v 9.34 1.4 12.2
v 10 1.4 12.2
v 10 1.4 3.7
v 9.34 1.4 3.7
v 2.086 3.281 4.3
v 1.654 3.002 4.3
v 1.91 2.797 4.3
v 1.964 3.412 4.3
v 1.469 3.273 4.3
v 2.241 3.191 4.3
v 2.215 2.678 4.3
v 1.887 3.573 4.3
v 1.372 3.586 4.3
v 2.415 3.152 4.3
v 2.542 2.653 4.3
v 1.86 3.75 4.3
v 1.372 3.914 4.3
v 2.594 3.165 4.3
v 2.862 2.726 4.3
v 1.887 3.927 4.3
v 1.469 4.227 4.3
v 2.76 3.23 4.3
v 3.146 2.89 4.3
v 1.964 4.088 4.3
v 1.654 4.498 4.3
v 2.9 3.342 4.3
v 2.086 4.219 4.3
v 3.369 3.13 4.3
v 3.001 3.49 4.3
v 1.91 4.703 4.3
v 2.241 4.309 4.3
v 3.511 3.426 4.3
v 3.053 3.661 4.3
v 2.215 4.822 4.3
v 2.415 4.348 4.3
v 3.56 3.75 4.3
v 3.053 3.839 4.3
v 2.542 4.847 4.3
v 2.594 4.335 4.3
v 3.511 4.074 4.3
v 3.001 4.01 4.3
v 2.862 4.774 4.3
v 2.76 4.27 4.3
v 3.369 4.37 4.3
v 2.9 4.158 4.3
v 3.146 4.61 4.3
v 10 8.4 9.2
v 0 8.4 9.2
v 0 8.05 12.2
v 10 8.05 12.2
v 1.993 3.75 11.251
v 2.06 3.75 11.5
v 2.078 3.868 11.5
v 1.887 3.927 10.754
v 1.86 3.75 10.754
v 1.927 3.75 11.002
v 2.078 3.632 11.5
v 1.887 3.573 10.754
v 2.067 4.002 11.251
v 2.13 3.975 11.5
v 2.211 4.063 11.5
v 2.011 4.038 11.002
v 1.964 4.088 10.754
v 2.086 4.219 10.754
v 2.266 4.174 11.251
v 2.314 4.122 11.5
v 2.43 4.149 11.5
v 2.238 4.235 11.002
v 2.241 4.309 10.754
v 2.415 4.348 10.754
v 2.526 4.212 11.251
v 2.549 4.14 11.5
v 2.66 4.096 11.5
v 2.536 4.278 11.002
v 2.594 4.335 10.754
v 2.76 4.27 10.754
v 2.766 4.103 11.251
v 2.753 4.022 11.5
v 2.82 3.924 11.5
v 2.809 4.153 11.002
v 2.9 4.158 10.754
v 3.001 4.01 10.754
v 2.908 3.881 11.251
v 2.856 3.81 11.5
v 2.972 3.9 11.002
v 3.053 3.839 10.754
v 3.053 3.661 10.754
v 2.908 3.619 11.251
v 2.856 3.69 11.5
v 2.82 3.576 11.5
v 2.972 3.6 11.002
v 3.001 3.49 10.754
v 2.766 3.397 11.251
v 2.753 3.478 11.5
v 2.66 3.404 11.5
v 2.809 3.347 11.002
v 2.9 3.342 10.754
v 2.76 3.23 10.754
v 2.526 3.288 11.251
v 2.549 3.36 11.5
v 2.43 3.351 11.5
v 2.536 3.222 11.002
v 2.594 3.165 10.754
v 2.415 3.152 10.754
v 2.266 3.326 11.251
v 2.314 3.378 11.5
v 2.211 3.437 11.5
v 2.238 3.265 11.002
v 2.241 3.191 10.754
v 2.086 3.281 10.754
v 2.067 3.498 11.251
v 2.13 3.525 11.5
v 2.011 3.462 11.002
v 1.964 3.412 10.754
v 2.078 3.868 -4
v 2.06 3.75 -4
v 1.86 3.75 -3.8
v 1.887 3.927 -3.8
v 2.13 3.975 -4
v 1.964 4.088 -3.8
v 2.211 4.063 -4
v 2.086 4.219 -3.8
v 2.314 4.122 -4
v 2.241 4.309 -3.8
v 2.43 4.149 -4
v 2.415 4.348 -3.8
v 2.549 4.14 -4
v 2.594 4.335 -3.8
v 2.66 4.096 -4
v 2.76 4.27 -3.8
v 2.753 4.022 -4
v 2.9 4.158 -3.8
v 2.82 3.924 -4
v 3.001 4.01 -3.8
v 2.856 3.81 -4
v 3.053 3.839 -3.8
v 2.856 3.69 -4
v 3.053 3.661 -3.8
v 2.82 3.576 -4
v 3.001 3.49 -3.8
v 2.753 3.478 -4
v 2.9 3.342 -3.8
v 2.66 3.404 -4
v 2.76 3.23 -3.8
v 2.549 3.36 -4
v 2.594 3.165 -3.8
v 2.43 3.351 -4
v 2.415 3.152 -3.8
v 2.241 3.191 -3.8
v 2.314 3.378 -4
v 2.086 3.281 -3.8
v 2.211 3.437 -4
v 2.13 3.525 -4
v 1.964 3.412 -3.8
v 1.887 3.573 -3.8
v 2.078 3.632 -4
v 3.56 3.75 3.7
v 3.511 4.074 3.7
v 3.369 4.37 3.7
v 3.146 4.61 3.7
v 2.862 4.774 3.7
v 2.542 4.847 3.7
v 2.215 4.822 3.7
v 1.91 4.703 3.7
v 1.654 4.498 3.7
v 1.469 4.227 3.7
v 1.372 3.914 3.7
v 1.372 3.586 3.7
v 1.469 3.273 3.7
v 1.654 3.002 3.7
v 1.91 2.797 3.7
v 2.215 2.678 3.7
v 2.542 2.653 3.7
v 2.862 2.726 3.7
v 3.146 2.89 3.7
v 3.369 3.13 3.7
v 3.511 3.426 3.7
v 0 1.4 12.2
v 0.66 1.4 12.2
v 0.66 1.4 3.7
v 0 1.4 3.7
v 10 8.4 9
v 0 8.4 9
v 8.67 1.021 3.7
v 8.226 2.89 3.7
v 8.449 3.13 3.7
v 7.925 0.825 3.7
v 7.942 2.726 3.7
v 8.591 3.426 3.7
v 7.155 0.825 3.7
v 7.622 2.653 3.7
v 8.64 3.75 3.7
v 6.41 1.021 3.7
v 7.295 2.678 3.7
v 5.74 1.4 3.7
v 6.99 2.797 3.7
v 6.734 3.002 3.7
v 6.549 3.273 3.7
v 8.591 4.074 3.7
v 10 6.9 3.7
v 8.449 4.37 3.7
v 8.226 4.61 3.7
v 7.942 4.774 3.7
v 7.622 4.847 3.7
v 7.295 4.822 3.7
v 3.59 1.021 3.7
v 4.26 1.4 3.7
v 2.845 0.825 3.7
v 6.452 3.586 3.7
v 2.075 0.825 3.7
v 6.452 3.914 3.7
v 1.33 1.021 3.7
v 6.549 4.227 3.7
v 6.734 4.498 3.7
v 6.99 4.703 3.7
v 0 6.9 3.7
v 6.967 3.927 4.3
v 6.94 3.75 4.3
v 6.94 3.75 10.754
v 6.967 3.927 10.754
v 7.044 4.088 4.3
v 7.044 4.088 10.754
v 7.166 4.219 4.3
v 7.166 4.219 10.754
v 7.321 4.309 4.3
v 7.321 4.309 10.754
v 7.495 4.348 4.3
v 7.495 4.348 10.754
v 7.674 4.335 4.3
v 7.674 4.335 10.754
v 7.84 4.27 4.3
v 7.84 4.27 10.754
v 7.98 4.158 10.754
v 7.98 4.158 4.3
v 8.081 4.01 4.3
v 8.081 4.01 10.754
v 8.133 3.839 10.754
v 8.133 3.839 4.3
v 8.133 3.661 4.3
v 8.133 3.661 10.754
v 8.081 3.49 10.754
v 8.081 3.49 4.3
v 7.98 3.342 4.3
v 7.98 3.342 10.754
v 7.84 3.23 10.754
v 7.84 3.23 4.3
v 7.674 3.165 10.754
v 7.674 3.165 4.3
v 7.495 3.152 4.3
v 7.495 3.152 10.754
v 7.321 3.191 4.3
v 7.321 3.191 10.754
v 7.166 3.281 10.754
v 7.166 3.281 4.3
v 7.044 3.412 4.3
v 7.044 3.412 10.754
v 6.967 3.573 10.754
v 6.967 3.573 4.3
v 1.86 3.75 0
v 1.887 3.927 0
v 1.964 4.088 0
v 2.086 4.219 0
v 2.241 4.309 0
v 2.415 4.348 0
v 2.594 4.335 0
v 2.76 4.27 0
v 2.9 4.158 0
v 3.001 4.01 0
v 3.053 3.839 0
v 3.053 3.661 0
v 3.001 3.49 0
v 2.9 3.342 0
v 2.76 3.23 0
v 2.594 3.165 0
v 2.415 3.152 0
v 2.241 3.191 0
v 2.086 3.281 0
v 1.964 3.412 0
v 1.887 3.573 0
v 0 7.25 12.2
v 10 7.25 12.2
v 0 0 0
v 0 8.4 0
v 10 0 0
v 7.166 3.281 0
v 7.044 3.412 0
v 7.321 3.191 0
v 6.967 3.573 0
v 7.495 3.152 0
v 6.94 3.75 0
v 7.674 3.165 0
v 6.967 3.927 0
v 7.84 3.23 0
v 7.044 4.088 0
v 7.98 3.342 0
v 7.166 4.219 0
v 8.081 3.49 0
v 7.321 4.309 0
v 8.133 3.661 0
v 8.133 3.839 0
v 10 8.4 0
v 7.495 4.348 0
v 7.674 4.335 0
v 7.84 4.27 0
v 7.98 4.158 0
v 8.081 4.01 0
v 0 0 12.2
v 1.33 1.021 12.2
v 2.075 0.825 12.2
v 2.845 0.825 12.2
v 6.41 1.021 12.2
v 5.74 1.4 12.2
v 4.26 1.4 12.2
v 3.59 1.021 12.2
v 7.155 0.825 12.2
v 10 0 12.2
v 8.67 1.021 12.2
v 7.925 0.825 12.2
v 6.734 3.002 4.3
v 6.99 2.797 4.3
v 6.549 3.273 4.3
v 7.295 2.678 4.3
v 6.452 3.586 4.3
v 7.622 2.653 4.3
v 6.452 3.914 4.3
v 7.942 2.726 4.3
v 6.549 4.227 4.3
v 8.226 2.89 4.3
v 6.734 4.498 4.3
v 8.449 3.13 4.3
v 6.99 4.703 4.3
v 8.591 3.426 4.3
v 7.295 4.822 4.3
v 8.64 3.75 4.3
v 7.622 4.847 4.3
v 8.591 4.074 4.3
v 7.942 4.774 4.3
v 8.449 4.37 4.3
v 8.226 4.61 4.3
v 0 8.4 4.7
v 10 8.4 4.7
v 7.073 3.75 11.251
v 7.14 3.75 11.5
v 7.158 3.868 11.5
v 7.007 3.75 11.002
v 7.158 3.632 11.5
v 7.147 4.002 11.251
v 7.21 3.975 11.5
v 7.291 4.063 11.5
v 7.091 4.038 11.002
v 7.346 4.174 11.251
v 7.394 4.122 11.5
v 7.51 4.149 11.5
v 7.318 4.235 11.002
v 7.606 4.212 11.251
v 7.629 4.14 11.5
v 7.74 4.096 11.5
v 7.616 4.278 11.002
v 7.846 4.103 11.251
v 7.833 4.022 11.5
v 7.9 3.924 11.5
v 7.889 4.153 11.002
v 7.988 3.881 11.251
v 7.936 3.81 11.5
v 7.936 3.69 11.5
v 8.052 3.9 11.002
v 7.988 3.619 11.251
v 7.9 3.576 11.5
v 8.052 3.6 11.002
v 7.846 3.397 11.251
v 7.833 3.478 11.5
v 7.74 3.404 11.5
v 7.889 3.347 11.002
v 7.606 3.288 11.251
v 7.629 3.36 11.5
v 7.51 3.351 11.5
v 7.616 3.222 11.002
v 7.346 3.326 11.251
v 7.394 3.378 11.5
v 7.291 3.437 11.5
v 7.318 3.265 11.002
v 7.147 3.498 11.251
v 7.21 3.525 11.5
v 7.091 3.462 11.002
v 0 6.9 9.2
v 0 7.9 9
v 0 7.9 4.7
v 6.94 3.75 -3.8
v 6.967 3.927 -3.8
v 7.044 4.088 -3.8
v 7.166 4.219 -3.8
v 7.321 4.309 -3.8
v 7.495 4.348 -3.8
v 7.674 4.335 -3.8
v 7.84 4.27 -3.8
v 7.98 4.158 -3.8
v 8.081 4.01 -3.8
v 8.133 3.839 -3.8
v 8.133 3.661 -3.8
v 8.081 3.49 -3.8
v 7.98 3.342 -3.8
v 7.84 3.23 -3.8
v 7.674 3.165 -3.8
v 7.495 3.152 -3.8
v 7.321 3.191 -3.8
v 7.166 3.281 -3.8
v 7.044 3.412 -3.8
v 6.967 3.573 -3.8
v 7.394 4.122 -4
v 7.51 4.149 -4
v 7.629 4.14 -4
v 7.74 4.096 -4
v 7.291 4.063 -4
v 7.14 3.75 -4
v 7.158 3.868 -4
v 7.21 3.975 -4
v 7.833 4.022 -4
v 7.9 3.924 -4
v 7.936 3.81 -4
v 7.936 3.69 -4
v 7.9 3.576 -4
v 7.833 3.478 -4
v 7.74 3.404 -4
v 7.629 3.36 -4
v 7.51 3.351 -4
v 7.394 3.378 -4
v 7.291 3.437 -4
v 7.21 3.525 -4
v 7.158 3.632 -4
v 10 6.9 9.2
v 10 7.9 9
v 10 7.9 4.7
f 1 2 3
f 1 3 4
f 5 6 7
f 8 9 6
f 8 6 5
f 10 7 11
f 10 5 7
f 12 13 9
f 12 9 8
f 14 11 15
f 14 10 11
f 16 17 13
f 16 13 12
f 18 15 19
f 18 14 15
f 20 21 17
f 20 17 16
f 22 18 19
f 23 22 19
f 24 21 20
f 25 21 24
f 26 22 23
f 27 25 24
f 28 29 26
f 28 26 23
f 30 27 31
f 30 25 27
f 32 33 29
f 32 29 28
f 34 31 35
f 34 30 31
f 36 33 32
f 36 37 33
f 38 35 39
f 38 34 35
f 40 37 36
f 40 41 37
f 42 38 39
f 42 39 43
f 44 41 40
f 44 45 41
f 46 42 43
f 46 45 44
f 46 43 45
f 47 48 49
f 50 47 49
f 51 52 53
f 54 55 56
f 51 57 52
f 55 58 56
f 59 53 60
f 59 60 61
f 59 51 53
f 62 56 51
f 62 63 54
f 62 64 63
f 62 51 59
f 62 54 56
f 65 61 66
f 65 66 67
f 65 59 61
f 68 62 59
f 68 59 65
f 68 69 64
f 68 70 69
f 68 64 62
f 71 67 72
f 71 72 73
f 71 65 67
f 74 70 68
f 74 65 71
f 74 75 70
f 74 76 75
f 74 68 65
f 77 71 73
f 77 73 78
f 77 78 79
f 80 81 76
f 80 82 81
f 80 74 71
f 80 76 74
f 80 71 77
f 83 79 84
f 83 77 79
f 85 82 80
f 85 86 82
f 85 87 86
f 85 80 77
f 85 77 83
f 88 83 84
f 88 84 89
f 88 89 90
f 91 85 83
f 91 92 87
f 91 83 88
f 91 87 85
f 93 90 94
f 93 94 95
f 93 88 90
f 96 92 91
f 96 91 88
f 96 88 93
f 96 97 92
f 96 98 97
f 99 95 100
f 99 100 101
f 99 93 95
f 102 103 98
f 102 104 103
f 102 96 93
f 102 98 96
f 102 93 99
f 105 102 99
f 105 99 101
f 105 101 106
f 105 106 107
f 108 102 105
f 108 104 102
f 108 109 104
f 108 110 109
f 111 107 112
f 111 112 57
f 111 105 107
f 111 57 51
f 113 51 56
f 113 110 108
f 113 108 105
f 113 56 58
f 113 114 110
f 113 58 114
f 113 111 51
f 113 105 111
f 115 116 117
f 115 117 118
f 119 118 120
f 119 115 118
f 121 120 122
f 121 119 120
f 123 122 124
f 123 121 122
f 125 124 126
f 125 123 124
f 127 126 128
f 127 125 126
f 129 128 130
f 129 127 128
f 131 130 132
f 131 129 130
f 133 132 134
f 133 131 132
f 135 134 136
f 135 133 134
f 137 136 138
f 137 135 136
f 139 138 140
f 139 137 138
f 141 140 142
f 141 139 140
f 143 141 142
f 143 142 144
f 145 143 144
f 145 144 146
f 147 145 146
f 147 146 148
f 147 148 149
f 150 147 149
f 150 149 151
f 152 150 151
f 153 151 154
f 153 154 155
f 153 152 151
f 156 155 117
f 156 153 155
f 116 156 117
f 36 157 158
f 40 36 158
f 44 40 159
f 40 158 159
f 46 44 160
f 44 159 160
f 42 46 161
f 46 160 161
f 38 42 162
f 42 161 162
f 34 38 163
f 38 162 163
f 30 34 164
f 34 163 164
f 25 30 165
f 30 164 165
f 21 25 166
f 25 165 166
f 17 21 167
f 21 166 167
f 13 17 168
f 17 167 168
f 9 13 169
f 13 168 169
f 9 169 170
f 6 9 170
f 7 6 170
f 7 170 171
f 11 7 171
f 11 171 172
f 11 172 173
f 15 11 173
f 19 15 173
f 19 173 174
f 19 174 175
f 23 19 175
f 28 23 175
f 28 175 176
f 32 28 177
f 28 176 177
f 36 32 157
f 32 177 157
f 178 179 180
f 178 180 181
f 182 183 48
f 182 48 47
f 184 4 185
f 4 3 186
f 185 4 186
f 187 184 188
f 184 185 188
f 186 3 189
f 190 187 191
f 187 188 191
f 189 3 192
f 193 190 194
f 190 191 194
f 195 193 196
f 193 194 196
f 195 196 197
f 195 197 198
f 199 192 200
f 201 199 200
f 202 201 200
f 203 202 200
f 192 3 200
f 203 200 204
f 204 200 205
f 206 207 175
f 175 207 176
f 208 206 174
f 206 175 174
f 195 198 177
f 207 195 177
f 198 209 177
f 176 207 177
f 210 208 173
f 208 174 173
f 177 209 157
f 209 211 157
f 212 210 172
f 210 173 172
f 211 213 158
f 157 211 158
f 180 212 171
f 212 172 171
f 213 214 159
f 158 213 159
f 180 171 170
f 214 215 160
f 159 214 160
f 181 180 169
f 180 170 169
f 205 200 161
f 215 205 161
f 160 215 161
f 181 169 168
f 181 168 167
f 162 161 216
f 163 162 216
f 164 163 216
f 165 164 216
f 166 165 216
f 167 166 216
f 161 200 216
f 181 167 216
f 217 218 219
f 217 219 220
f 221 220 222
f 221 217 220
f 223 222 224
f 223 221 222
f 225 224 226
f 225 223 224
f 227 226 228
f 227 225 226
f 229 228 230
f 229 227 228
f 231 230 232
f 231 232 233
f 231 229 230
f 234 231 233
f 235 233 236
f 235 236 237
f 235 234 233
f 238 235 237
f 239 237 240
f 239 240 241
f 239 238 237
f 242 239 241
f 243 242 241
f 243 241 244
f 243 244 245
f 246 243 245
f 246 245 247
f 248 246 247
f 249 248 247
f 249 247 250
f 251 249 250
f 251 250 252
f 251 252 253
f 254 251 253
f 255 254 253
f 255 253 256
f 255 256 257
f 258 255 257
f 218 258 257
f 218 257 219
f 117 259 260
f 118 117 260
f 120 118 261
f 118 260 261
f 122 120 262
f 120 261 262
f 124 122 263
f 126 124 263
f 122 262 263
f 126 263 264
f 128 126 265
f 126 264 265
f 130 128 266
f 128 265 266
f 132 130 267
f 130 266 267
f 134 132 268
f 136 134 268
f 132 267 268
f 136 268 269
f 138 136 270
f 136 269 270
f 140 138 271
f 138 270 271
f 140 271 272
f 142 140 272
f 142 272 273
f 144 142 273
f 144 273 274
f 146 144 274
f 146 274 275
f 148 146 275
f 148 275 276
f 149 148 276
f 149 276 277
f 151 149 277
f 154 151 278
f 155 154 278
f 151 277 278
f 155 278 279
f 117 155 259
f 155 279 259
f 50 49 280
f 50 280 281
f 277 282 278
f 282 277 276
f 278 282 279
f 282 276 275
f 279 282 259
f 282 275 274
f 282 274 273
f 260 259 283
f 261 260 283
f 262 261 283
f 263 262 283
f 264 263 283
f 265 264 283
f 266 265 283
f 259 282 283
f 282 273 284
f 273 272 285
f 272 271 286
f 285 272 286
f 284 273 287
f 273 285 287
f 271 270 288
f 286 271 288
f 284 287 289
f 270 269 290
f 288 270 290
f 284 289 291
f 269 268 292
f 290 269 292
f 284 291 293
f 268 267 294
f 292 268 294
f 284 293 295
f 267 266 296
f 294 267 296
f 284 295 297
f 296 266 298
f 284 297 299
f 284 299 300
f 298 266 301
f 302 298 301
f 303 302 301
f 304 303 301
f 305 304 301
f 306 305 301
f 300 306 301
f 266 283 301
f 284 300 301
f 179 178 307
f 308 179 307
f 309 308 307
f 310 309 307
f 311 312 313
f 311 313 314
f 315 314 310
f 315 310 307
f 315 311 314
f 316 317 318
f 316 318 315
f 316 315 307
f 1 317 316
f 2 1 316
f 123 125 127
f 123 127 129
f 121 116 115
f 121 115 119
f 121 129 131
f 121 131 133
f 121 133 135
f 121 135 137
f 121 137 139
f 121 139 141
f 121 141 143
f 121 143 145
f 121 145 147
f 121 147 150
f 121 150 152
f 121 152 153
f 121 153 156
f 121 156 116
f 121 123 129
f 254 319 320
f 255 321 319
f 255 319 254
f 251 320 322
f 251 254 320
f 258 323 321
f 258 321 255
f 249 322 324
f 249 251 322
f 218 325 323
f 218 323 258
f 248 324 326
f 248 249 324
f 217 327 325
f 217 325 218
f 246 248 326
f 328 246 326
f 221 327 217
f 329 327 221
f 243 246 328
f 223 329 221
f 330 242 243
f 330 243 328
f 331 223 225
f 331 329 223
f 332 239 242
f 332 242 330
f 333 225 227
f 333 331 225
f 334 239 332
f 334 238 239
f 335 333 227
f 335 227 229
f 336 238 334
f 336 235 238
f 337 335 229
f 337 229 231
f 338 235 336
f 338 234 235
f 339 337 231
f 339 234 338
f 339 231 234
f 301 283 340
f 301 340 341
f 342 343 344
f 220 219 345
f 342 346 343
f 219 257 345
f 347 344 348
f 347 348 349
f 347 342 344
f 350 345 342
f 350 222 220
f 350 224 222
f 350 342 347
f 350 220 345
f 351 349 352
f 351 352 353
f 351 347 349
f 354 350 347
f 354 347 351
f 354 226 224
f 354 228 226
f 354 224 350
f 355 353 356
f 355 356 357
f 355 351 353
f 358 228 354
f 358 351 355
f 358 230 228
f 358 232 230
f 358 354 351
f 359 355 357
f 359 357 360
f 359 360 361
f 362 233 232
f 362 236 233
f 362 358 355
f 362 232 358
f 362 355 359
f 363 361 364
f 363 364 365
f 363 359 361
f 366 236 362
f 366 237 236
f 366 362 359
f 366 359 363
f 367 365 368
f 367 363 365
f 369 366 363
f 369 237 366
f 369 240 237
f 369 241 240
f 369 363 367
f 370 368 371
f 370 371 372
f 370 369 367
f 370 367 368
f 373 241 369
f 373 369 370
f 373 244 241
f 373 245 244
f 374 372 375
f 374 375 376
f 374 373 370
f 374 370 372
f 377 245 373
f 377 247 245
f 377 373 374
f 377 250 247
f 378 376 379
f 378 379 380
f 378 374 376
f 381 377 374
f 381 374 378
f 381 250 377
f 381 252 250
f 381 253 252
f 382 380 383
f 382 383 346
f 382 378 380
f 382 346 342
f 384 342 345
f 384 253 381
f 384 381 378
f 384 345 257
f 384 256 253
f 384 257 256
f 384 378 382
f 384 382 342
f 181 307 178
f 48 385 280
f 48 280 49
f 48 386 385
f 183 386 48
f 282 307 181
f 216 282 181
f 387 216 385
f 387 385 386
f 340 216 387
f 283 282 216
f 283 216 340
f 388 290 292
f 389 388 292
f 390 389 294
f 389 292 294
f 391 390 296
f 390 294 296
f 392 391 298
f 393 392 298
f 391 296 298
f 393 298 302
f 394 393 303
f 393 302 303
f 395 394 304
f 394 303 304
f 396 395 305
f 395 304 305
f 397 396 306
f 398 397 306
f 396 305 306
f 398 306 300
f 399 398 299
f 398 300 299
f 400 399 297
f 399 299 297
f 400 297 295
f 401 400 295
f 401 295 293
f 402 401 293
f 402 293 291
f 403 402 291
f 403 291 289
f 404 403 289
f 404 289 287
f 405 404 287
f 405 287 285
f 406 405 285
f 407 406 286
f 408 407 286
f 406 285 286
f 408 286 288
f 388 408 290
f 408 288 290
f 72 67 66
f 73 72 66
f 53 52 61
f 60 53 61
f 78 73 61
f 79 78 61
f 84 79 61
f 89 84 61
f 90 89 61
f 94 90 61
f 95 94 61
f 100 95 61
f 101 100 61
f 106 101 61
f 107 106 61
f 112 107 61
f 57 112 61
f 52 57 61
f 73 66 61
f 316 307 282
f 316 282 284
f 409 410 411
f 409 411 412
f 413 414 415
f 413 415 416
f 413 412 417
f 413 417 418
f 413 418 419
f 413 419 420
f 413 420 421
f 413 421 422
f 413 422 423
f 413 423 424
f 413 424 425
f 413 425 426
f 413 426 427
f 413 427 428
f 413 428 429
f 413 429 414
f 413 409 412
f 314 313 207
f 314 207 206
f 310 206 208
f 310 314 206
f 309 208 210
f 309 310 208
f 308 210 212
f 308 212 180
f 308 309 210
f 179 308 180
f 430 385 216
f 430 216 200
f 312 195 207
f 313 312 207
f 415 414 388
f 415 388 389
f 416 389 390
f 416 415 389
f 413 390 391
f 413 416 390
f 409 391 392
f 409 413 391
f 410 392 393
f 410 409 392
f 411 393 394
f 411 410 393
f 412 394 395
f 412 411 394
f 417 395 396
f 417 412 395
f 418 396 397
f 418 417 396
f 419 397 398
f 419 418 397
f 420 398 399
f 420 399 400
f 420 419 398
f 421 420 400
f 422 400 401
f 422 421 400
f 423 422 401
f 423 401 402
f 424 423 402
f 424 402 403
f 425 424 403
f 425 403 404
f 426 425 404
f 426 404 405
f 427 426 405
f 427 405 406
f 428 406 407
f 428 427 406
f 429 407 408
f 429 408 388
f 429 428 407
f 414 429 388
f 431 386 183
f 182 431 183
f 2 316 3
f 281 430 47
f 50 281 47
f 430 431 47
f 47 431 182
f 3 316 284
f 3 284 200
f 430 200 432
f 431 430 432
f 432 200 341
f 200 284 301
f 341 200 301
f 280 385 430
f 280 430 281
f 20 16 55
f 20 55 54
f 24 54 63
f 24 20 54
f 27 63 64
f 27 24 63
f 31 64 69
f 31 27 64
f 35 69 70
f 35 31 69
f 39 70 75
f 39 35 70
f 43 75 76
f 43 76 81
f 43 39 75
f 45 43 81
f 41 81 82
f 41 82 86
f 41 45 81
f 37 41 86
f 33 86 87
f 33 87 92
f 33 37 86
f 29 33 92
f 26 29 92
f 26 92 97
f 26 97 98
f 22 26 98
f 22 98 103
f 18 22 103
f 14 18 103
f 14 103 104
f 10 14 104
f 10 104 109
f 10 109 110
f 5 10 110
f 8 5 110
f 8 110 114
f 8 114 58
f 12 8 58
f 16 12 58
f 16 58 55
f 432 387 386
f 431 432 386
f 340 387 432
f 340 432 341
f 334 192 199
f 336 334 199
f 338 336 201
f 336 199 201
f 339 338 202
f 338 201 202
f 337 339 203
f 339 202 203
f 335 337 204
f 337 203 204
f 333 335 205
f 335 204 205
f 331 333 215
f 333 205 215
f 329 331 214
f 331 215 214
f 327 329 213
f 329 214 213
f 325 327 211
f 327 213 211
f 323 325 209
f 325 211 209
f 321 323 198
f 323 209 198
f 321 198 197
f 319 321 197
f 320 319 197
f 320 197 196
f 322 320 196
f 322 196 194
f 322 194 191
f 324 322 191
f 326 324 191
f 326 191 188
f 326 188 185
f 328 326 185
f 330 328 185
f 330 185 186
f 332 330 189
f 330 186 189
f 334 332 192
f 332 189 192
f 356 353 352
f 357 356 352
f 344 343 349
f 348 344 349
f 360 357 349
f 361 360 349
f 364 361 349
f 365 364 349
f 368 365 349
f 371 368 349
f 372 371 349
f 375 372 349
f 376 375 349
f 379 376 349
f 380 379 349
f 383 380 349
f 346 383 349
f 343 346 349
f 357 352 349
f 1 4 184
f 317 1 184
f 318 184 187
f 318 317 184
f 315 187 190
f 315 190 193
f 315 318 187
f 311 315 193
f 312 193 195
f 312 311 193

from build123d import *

# Parameters (mm, degrees)
ESQUISSE1_W             = 10
ESQUISSE1_H             = 8.4
BOSS_EXTRU_1_DEPTH      = 12.2
ENL_V_MAT_EXTRU_1_DEPTH = 8.5
ESQUISSE3_W             = 4.3
ESQUISSE3_H             = 0.5
ENL_V_MAT_EXTRU_2_DEPTH = 11
ESQUISSE4_R             = 0.6
BOSS_EXTRU_2_DEPTH      = 4
BOSS_EXTRU_2_DEPTH_BACK = 11.5
CHANFREIN1_SIZE         = 0.2
CHANFREIN1_SIZE2        = 0.746410162
CHANFREIN1_PART_2_SIZE  = 0.2
CHANFREIN1_PART_2_SIZE2 = 0.746410162
CHANFREIN2_SIZE         = 0.2
ESQUISSE5_R             = 1.1
BOSS_EXTRU_3_DEPTH      = 0.6


with BuildPart() as part:
    # Esquisse1 → Boss.-Extru.1 (new body)
    with BuildSketch(Plane.XY):
        with Locations((5, 4.2)):
            Rectangle(ESQUISSE1_W, ESQUISSE1_H)
    extrude(amount=BOSS_EXTRU_1_DEPTH)

    # Esquisse2 → Enlèv. mat.-Extru.1 (cut)
    with BuildSketch(Plane.XY.offset(12.2)):
        with BuildLine():
            Line((0, 1.4), (0, 6.9))
            Line((0, 6.9), (10, 6.9))
            Line((10, 6.9), (10, 1.4))
            Line((10, 1.4), (9.34, 1.4))
            ThreePointArc((9.34, 1.4), (7.54, 0.8), (5.74, 1.4))
            Line((5.74, 1.4), (4.26, 1.4))
            ThreePointArc((4.26, 1.4), (2.46, 0.8), (0.66, 1.4))
            Line((0.66, 1.4), (0, 1.4))
        make_face()
    extrude(amount=-ENL_V_MAT_EXTRU_1_DEPTH, mode=Mode.SUBTRACT)

    # Esquisse3 → Enlèv. mat.-Extru.2 (cut, through all)
    with BuildSketch(Plane.ZY):
        with Locations((6.85, 8.15)):
            Rectangle(ESQUISSE3_W, ESQUISSE3_H)
        Polygon((12.2, 8.4), (9.2, 8.4), (12.2, 8.05), align=None)
        Polygon((12.2, 7.25), (12.2, 6.9), (9.2, 6.9), align=None)
    extrude(amount=-ENL_V_MAT_EXTRU_2_DEPTH, mode=Mode.SUBTRACT)

    # Esquisse4 → Boss.-Extru.2 (add, two sides)
    with BuildSketch(Plane(origin=(0, 0, 0), x_dir=(-1, 0, 0), z_dir=(0, 0, -1))) as boss_extru_2_sk:
        with Locations((-7.54, 3.75)):
            Circle(ESQUISSE4_R)
        with Locations((-2.46, 3.75)):
            Circle(ESQUISSE4_R)
    extrude(amount=BOSS_EXTRU_2_DEPTH)
    extrude(boss_extru_2_sk.sketch, amount=-BOSS_EXTRU_2_DEPTH_BACK)

    # Chanfrein1
    chanfrein1_edges = [part.edges().sort_by_distance(p)[0] for p in [
        (8.14, 3.75, 11.5),
    ]]
    chanfrein1_side = [part.faces().sort_by_distance(p)[0] for p in [
        (7.54, 3.75, 11.5),
    ]]
    chamfer(chanfrein1_edges, length=CHANFREIN1_SIZE, length2=CHANFREIN1_SIZE2, reference=chanfrein1_side[0])

    # Chanfrein1 part 2
    chanfrein1_part_2_edges = [part.edges().sort_by_distance(p)[0] for p in [
        (3.06, 3.75, 11.5),
    ]]
    chanfrein1_part_2_side = [part.faces().sort_by_distance(p)[0] for p in [
        (2.46, 3.75, 11.5),
    ]]
    chamfer(chanfrein1_part_2_edges, length=CHANFREIN1_PART_2_SIZE, length2=CHANFREIN1_PART_2_SIZE2, reference=chanfrein1_part_2_side[0])

    # Chanfrein2
    chanfrein2_edges = [part.edges().sort_by_distance(p)[0] for p in [
        (8.14, 3.75, -4),
        (3.06, 3.75, -4),
    ]]
    chamfer(chanfrein2_edges, length=CHANFREIN2_SIZE)

    # Esquisse5 → Boss.-Extru.3 (add)
    with BuildSketch(Plane.XY.offset(3.7)):
        with Locations((2.46, 3.75)):
            Circle(ESQUISSE5_R)
        with Locations((7.54, 3.75)):
            Circle(ESQUISSE5_R)
    extrude(amount=BOSS_EXTRU_3_DEPTH)


solid = part.part
